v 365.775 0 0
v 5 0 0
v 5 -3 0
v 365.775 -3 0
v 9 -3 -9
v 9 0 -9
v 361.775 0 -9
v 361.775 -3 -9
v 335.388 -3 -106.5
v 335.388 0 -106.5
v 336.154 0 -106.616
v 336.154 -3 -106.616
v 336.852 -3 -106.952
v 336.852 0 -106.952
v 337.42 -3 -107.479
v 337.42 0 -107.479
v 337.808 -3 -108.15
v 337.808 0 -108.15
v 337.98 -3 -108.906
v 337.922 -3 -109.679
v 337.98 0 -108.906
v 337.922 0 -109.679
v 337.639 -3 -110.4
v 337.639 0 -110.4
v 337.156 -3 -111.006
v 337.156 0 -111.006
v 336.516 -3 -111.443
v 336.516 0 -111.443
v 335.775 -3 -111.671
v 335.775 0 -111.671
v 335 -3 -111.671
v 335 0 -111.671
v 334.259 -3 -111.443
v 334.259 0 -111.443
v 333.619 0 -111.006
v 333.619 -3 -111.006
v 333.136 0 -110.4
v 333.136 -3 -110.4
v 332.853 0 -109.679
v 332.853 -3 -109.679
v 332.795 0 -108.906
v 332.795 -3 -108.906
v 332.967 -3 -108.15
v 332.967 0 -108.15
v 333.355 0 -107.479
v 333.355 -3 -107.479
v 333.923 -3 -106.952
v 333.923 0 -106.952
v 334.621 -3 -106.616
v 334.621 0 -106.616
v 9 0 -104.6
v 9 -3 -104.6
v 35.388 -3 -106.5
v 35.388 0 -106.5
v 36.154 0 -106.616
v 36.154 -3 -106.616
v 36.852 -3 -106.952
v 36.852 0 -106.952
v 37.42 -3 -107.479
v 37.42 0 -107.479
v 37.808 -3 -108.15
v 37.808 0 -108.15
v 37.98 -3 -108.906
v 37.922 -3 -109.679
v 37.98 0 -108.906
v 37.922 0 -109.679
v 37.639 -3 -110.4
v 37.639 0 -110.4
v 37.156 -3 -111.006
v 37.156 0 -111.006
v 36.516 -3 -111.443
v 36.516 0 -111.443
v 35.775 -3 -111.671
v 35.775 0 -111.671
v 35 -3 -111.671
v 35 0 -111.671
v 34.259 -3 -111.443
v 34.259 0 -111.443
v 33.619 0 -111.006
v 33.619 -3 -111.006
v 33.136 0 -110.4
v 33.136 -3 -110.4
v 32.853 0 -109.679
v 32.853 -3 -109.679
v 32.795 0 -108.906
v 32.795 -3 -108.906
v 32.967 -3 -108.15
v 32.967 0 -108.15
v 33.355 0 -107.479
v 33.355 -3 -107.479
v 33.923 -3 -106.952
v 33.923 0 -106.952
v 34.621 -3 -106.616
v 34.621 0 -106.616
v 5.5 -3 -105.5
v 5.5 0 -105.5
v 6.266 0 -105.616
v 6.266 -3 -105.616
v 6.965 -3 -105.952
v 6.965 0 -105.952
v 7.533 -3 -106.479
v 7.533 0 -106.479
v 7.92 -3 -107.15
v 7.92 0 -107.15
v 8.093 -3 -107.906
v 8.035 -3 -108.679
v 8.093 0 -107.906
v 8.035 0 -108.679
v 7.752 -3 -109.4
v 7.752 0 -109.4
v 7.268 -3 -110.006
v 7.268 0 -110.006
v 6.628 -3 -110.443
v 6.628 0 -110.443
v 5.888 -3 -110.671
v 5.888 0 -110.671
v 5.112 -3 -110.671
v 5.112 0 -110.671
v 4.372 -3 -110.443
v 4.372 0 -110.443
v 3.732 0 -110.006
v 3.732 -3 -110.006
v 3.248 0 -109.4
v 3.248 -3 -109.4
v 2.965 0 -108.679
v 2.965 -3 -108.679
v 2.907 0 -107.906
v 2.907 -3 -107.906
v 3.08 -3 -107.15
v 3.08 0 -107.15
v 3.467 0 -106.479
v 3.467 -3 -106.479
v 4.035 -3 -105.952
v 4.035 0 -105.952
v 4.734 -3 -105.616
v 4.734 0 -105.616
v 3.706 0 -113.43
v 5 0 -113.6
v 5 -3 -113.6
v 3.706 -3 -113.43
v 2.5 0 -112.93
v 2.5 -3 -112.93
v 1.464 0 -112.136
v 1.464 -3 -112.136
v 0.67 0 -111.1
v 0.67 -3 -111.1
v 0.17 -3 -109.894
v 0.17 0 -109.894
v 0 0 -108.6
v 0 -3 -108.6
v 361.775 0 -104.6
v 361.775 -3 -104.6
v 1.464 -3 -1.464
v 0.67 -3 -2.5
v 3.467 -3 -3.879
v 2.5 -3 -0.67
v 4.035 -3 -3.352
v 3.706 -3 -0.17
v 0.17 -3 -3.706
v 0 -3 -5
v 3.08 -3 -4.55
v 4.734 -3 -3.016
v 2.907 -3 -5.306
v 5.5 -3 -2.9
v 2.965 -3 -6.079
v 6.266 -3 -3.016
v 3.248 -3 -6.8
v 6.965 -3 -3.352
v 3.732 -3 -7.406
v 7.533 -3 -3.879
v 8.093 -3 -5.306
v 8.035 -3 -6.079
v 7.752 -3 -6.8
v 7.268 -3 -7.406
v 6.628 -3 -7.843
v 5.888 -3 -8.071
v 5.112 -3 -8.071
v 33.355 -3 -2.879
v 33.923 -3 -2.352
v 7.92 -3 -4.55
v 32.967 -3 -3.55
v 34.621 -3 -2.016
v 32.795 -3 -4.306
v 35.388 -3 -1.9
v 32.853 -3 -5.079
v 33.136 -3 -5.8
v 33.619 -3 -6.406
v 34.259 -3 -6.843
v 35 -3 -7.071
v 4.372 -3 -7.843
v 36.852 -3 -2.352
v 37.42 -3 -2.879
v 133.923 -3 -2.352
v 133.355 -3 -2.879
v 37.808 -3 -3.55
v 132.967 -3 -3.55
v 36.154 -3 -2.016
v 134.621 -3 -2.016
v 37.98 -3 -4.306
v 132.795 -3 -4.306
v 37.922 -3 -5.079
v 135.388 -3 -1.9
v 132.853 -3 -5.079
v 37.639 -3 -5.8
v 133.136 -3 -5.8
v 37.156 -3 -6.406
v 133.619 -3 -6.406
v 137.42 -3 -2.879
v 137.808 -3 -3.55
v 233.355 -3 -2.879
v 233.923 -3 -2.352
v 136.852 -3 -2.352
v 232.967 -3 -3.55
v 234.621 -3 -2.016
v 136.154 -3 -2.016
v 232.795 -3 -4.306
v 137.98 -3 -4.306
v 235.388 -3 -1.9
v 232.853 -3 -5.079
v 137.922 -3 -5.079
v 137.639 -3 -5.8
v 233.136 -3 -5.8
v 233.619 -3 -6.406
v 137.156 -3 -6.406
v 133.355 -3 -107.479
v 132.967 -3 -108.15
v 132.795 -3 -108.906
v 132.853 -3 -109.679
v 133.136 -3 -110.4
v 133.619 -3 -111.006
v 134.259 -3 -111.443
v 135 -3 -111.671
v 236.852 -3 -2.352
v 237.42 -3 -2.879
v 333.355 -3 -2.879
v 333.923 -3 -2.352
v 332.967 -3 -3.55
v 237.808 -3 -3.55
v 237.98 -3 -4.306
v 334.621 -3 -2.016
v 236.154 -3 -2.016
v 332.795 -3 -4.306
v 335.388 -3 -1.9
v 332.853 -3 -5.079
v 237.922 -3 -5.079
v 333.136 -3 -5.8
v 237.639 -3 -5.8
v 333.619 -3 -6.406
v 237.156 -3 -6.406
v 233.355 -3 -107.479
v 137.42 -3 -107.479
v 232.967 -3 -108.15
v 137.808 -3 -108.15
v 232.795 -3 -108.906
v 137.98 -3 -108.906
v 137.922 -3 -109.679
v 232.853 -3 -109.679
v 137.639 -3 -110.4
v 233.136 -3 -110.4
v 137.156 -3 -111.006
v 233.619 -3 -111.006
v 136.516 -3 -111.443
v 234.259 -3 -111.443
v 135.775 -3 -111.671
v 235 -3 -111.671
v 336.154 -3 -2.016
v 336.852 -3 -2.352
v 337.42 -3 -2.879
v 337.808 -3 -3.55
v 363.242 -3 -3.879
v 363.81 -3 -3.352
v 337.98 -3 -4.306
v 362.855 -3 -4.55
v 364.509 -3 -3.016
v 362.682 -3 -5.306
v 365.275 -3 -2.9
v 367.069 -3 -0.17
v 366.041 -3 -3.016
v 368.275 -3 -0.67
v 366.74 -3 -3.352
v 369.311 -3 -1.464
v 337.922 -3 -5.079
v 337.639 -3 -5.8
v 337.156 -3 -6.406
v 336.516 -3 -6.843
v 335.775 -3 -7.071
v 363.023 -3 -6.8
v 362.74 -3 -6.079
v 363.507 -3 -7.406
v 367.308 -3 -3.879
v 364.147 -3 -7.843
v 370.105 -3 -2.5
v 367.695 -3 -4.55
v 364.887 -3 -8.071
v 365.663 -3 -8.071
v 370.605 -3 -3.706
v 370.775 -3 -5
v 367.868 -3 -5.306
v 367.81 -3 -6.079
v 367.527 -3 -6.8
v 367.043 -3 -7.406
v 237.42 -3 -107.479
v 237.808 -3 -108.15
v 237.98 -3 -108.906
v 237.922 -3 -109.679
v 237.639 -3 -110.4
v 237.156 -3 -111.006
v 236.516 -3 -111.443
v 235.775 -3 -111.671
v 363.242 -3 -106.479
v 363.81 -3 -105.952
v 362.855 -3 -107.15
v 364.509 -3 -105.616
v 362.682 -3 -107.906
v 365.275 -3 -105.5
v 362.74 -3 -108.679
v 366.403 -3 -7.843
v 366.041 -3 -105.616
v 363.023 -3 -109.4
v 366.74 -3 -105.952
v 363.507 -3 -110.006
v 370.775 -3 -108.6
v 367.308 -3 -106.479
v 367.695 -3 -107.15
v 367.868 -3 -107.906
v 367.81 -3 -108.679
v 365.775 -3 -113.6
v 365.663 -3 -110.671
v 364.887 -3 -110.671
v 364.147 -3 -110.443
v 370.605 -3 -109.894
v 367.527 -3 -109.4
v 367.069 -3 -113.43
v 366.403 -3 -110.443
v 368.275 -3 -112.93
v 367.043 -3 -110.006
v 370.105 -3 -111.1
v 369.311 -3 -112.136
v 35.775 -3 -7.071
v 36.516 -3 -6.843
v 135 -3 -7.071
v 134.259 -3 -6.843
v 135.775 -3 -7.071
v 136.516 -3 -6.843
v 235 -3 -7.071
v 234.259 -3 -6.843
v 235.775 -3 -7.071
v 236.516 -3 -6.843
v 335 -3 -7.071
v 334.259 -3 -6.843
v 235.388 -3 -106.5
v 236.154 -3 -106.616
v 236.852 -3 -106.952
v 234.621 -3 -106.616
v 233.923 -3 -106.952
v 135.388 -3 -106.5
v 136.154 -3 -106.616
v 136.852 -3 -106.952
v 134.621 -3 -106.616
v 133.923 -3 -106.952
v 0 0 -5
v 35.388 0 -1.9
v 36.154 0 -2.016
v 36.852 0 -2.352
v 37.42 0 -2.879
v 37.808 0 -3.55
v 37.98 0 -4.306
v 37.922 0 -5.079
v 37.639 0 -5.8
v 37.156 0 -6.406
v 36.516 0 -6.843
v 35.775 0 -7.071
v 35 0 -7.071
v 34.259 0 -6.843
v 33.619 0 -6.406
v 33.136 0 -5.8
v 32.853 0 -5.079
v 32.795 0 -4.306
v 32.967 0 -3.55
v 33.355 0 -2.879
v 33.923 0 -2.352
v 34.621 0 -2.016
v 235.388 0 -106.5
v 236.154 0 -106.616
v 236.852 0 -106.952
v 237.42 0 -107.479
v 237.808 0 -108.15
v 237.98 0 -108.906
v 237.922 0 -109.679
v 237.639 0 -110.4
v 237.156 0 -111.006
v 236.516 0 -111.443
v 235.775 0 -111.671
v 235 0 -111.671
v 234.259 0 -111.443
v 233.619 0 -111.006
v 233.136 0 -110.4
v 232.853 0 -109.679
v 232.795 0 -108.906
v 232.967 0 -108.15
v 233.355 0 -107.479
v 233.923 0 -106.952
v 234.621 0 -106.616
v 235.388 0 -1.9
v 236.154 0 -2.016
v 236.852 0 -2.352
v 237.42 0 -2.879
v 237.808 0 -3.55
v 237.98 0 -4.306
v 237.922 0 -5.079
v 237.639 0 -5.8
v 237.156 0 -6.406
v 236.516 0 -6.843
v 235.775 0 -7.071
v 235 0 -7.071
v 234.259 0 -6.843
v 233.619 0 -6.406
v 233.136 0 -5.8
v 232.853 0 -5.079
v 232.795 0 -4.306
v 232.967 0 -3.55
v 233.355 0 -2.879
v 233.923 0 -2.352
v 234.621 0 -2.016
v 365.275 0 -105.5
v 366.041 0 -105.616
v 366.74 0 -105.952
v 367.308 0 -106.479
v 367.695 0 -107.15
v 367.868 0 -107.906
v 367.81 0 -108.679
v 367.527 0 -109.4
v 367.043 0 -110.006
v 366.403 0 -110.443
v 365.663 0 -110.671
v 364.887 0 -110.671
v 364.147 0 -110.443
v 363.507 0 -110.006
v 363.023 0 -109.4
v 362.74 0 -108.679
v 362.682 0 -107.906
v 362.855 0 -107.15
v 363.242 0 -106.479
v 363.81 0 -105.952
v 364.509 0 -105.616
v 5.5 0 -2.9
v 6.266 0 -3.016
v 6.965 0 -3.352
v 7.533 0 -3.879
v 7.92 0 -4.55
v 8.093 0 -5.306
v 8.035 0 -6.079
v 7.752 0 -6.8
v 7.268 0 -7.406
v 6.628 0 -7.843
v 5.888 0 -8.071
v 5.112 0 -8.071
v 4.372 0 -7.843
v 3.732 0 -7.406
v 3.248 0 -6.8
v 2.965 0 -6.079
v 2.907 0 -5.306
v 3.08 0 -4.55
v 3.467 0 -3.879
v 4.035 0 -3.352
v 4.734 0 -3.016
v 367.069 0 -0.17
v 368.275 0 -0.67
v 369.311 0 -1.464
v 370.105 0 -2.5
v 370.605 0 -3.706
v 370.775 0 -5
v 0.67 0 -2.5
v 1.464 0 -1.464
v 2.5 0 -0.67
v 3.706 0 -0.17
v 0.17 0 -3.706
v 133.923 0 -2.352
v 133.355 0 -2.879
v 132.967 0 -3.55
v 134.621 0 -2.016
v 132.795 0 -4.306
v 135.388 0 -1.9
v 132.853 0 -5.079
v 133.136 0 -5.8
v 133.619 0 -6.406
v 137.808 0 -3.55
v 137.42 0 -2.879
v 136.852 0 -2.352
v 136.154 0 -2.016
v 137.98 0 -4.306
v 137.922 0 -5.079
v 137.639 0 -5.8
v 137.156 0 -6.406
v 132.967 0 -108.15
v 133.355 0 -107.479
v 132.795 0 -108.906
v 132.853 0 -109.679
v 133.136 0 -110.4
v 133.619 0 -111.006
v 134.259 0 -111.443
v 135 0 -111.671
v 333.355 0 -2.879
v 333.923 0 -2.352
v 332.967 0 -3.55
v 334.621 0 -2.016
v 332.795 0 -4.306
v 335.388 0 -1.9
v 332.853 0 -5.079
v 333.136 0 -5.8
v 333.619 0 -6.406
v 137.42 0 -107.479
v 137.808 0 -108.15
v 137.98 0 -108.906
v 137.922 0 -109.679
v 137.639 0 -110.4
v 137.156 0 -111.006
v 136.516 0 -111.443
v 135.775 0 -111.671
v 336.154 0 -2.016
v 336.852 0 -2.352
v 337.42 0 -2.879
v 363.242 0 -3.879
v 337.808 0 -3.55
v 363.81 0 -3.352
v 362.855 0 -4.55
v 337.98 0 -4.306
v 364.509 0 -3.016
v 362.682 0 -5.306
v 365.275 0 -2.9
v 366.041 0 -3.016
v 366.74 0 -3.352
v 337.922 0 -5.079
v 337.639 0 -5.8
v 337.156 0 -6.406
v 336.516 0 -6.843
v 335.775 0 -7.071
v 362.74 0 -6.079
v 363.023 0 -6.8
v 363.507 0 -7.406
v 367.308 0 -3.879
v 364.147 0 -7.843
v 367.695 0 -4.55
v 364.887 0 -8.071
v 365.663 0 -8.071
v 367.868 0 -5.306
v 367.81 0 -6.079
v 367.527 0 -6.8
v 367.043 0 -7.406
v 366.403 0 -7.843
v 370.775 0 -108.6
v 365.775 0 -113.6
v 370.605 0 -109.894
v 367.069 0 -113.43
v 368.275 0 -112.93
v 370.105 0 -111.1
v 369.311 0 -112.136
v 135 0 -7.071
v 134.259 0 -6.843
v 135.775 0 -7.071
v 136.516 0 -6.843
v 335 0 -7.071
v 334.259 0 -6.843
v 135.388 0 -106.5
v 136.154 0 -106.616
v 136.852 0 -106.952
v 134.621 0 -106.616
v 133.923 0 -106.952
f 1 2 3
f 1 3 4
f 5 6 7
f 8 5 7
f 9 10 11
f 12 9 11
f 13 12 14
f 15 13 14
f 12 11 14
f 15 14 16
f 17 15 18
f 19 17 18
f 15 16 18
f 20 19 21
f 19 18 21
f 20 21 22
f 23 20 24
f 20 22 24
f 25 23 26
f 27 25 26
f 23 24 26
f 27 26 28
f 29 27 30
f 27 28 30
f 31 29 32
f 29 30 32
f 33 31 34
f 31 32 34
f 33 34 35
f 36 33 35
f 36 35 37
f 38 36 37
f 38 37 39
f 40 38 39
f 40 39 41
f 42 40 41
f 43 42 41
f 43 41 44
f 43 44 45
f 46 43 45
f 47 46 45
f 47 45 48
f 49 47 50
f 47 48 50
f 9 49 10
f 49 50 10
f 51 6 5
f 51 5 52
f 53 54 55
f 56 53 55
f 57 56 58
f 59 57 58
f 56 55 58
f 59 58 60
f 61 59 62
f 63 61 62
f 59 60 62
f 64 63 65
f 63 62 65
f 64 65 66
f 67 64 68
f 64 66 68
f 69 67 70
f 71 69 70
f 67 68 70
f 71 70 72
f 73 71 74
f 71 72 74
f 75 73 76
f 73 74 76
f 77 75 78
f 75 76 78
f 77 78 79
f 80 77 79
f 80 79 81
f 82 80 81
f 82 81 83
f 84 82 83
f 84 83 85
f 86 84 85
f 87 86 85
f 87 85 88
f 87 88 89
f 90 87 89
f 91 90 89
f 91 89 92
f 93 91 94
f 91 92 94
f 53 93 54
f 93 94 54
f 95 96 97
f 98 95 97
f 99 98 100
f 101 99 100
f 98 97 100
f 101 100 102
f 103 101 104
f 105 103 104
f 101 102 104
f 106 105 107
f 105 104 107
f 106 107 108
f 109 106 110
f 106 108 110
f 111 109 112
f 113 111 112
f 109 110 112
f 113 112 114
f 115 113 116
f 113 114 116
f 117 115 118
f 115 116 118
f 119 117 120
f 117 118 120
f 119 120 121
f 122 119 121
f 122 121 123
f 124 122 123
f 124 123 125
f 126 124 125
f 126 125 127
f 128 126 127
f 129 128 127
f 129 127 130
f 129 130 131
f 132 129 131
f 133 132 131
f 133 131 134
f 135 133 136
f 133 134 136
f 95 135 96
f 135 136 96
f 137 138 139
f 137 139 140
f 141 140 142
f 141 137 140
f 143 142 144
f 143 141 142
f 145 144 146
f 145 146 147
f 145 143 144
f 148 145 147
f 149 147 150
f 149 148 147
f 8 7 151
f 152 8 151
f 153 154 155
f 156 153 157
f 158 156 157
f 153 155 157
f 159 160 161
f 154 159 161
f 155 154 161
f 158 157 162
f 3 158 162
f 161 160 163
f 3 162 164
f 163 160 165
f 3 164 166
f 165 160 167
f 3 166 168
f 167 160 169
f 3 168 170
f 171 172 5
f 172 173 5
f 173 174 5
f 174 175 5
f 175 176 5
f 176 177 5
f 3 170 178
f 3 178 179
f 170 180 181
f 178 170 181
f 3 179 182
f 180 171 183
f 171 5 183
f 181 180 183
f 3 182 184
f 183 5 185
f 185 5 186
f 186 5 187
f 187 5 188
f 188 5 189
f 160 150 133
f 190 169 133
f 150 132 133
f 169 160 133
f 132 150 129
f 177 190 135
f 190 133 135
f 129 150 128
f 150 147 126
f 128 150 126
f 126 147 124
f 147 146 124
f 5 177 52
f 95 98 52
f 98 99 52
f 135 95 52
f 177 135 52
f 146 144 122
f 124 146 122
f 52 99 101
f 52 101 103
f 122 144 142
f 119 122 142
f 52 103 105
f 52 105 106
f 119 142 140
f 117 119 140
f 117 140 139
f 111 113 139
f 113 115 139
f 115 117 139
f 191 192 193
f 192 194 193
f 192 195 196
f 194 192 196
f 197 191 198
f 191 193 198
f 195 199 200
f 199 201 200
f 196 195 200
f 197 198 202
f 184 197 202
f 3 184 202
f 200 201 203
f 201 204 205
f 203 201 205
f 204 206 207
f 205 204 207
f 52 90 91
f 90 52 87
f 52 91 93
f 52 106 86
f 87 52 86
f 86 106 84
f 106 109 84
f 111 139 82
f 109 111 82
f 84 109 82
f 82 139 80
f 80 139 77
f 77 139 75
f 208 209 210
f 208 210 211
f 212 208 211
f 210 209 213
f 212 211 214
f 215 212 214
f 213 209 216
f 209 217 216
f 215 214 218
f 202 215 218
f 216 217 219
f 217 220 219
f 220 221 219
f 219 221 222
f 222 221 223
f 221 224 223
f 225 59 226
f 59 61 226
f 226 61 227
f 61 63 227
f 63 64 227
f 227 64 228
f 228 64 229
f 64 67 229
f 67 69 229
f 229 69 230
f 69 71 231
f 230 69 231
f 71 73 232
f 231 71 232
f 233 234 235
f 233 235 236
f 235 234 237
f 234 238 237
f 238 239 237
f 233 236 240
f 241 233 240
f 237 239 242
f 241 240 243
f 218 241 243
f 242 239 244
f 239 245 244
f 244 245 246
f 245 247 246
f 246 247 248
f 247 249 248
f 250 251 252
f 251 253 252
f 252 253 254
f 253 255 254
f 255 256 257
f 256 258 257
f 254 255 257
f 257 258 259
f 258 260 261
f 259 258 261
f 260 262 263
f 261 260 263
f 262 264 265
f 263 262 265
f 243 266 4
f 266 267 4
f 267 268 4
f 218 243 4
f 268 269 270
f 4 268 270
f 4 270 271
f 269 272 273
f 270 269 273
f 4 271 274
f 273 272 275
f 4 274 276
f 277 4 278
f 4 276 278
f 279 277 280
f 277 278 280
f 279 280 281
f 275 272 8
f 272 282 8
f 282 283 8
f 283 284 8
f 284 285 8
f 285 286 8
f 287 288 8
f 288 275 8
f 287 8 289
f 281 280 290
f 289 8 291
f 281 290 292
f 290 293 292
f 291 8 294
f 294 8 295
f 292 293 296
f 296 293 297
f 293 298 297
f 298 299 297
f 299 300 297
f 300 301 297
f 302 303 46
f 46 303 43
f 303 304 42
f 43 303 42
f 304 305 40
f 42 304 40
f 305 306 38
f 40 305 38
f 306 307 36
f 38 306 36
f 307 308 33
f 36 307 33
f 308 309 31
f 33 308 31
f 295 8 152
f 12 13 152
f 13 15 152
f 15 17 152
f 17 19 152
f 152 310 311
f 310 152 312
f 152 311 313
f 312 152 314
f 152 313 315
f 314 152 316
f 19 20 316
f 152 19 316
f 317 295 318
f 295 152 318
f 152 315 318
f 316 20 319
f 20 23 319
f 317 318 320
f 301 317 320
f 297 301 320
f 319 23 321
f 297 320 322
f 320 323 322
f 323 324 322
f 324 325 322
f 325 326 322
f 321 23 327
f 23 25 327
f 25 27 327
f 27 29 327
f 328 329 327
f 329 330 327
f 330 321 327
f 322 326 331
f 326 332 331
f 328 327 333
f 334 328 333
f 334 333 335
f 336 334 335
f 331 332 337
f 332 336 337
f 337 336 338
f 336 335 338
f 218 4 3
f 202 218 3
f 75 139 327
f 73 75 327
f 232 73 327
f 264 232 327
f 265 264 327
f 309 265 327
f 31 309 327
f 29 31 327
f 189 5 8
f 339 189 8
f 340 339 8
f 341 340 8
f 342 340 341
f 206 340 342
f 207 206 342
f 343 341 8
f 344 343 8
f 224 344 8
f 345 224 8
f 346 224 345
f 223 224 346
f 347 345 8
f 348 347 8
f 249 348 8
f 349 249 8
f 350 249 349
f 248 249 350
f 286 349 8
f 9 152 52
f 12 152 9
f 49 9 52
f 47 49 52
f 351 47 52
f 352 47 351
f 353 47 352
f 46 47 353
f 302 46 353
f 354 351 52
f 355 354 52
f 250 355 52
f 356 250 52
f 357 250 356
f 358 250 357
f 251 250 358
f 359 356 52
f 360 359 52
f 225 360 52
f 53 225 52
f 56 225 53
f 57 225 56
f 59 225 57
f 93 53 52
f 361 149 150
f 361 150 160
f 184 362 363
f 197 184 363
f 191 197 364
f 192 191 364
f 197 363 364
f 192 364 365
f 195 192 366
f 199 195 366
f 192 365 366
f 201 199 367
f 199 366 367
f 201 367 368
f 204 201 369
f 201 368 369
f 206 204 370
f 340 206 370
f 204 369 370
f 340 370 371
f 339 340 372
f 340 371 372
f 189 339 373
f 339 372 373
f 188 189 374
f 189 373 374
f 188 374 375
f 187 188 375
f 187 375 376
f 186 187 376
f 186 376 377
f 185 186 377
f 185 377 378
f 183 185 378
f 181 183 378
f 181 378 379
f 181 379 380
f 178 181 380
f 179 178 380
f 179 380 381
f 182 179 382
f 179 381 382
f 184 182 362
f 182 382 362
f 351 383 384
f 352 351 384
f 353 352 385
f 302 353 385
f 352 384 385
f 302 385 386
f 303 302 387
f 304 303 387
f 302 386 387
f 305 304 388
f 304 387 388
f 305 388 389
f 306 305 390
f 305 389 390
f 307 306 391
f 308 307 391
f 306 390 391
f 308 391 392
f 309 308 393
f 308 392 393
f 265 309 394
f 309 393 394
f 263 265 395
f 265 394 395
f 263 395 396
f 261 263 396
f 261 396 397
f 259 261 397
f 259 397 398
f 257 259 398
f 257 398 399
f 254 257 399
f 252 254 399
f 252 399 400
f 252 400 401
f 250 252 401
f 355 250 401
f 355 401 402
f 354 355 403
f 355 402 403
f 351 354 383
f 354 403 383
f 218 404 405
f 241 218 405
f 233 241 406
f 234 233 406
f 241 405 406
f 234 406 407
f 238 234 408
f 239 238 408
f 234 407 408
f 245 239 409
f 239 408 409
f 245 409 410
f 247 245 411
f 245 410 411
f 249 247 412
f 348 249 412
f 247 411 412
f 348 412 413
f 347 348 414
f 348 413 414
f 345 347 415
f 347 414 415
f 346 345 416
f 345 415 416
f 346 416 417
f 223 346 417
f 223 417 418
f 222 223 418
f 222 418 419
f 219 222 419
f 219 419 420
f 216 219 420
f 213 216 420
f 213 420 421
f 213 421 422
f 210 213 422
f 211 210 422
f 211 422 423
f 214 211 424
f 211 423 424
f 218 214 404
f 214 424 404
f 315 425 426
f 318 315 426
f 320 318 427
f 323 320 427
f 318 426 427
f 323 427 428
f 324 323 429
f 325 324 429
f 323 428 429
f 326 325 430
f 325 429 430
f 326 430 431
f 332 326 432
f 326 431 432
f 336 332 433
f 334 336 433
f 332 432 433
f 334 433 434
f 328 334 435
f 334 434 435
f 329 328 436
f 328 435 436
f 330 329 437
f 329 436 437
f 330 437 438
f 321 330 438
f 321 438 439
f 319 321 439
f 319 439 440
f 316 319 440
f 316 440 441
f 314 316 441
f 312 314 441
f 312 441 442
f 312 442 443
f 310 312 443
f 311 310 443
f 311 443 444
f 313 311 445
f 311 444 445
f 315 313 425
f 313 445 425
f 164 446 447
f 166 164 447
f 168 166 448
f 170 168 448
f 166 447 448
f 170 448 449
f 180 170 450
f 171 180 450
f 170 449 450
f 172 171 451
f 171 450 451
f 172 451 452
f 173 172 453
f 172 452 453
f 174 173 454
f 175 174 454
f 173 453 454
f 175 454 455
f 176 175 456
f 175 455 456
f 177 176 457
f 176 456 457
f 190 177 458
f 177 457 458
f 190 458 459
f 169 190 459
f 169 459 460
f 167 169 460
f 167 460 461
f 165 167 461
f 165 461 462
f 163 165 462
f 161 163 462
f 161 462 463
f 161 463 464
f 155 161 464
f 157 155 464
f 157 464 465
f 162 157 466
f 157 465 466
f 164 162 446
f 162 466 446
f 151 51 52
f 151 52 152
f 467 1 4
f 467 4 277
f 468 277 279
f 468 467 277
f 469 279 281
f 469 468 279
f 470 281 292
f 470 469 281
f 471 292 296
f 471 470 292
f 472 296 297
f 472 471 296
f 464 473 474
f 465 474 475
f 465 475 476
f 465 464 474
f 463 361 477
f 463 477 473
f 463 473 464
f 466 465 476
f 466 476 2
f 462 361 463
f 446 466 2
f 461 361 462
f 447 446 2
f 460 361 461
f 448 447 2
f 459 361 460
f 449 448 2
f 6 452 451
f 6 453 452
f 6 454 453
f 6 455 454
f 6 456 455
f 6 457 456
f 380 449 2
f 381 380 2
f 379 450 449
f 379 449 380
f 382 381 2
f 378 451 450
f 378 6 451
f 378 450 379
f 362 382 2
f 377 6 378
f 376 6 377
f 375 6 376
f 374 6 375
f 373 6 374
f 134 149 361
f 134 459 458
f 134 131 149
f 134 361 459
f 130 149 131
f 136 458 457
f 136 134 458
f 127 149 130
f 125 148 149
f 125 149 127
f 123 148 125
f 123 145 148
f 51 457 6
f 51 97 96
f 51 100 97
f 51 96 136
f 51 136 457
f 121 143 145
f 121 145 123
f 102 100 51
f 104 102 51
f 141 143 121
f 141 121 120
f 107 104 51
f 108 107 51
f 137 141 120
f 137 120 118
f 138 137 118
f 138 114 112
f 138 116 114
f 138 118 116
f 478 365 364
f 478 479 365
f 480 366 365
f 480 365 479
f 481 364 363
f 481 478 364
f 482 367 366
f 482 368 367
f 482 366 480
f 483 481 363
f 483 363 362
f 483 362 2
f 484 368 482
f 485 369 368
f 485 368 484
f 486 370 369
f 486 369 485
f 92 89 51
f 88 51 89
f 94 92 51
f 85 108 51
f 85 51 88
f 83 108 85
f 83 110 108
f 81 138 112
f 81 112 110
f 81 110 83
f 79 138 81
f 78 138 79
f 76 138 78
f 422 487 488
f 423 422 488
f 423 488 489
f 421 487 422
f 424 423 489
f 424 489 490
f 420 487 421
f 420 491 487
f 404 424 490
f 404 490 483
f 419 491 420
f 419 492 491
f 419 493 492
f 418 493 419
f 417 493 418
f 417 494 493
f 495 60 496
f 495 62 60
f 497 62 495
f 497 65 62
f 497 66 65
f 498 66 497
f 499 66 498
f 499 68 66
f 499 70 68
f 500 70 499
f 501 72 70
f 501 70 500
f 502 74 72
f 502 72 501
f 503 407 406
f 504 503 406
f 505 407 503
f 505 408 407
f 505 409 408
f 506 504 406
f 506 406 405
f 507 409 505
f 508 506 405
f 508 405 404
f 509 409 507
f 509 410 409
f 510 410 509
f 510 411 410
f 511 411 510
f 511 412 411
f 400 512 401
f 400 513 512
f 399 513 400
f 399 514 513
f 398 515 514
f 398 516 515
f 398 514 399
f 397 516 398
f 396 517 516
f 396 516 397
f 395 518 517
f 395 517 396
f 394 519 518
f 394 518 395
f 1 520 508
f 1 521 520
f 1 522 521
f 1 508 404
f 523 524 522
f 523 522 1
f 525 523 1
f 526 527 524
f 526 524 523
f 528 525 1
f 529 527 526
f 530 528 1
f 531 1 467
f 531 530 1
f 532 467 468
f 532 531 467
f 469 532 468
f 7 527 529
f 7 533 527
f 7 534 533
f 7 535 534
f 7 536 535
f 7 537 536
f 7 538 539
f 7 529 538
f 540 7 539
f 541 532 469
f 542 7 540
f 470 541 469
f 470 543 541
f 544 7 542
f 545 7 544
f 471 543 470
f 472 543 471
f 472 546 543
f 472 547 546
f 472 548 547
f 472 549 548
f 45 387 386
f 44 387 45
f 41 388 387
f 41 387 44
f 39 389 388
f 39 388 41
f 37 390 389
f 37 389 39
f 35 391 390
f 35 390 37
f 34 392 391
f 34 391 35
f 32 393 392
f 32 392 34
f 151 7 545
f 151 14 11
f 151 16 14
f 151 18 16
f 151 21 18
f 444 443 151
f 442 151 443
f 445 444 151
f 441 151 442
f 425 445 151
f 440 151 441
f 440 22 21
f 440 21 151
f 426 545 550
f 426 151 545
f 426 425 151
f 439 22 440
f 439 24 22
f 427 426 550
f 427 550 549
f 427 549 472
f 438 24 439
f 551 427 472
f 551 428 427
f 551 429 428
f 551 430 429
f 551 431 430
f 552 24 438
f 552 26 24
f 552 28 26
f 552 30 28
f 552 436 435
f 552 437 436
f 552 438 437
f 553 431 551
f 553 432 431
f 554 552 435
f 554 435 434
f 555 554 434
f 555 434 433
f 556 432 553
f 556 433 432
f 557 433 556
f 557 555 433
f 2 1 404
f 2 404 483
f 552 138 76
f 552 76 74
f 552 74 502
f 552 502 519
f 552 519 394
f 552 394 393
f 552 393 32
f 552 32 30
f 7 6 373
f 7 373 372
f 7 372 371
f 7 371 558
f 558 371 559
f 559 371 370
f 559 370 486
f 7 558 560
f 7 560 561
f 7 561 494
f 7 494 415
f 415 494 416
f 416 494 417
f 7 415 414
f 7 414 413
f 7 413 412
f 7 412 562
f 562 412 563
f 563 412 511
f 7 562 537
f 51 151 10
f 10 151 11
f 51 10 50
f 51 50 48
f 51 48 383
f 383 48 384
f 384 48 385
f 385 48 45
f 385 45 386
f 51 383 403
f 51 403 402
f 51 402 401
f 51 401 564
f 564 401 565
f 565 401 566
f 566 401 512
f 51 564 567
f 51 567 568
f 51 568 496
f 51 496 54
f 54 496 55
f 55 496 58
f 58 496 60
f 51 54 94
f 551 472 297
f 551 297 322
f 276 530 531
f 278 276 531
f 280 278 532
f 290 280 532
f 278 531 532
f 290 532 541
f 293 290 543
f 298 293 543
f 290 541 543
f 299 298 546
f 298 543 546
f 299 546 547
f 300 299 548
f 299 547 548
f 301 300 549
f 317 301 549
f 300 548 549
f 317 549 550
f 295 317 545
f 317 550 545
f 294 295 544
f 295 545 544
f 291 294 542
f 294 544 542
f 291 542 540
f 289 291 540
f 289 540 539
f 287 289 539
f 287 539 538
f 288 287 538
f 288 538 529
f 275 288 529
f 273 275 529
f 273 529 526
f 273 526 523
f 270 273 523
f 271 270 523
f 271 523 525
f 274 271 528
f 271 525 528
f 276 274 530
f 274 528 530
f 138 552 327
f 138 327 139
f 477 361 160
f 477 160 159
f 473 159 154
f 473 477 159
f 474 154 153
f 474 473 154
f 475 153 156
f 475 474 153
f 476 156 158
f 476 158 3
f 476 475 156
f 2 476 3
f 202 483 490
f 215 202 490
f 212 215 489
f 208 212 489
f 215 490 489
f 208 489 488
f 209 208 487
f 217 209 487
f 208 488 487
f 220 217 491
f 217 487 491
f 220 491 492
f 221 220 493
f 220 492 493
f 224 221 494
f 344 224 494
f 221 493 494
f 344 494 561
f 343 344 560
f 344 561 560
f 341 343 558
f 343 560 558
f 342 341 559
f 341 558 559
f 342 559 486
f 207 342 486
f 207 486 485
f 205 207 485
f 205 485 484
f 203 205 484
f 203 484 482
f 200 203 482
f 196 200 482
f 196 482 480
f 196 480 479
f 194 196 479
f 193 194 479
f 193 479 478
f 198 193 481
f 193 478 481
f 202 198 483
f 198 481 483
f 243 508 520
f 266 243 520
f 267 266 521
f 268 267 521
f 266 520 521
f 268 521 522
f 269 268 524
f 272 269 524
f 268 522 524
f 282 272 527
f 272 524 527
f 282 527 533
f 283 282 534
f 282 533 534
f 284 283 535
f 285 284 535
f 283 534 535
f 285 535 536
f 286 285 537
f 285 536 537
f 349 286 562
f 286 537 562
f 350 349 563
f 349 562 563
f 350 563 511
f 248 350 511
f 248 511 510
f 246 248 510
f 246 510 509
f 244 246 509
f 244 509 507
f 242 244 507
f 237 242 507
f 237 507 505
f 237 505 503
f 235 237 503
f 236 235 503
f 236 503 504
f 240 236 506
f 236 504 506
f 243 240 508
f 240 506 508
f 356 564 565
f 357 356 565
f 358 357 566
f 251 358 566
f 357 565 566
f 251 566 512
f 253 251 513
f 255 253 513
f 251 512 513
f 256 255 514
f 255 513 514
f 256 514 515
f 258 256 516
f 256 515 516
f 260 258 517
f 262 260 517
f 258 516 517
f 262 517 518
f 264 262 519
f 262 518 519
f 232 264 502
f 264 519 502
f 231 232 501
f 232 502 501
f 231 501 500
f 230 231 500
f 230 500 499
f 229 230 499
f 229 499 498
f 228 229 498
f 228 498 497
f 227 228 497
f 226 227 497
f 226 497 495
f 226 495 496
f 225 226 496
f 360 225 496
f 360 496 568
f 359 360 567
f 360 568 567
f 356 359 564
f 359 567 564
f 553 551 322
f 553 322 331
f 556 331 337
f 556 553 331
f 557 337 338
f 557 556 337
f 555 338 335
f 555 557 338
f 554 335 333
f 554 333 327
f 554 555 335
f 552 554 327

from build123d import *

# Parameters (mm, degrees)
SKETCH1_R           = 2.6
SKETCH1_W           = 352.775
SKETCH1_H           = 95.6
BOSS_EXTRUDE1_DEPTH = 3


with BuildPart() as part:
    # Sketch1 → Boss-Extrude1 (new body)
    with BuildSketch(Plane(origin=(0, 0, 0), x_dir=(1, 0, 0), z_dir=(0, 1, 0))):
        with BuildLine():
            Line((4.973e-06, 108.599998007), (4.973e-06, 4.999998007))
            ThreePointArc((4.973e-06, 4.999998007), (1.464471067, 1.464464101), (5.000004973, -1.993e-06))
            Line((5.000004973, -1.993e-06), (365.775004973, -1.993e-06))
            ThreePointArc((365.775004973, -1.993e-06), (369.310538879, 1.464464101), (370.775004973, 4.999998007))
            Line((370.775004973, 4.999998007), (370.775004973, 108.599998007))
            ThreePointArc((370.775004973, 108.599998007), (369.310538879, 112.135531913), (365.775004973, 113.599998007))
            Line((365.775004973, 113.599998007), (5.000004973, 113.599998007))
            ThreePointArc((5.000004973, 113.599998007), (1.464471067, 112.135531913), (4.973e-06, 108.599998007))
        make_face()
        with Locations(Location((5.500004973, 108.099998007, 0), (0, 0, 270))):
            Circle(SKETCH1_R, mode=Mode.SUBTRACT)
        with Locations(Location((5.500004973, 5.499998007, 0), (0, 0, 270))):
            Circle(SKETCH1_R, mode=Mode.SUBTRACT)
        with Locations(Location((365.275004973, 5.499998007, 0), (0, 0, 270))):
            Circle(SKETCH1_R, mode=Mode.SUBTRACT)
        with Locations(Location((365.275004973, 108.099998007, 0), (0, 0, 270))):
            Circle(SKETCH1_R, mode=Mode.SUBTRACT)
        with Locations(Location((35.387504973, 4.499998007, 0), (0, 0, 270))):
            Circle(SKETCH1_R, mode=Mode.SUBTRACT)
        with Locations(Location((135.387504973, 4.499998007, 0), (0, 0, 270))):
            Circle(SKETCH1_R, mode=Mode.SUBTRACT)
        with Locations(Location((335.387504973, 4.499998007, 0), (0, 0, 270))):
            Circle(SKETCH1_R, mode=Mode.SUBTRACT)
        with Locations(Location((235.387504973, 4.499998007, 0), (0, 0, 270))):
            Circle(SKETCH1_R, mode=Mode.SUBTRACT)
        with Locations(Location((35.387504973, 109.099998007, 0), (0, 0, 270))):
            Circle(SKETCH1_R, mode=Mode.SUBTRACT)
        with Locations(Location((135.387504973, 109.099998007, 0), (0, 0, 270))):
            Circle(SKETCH1_R, mode=Mode.SUBTRACT)
        with Locations(Location((335.387504973, 109.099998007, 0), (0, 0, 270))):
            Circle(SKETCH1_R, mode=Mode.SUBTRACT)
        with Locations(Location((235.387504973, 109.099998007, 0), (0, 0, 270))):
            Circle(SKETCH1_R, mode=Mode.SUBTRACT)
        with Locations((185.387504973, 56.799998007)):
            Rectangle(SKETCH1_W, SKETCH1_H, mode=Mode.SUBTRACT)
    extrude(amount=-BOSS_EXTRUDE1_DEPTH)


solid = part.part
